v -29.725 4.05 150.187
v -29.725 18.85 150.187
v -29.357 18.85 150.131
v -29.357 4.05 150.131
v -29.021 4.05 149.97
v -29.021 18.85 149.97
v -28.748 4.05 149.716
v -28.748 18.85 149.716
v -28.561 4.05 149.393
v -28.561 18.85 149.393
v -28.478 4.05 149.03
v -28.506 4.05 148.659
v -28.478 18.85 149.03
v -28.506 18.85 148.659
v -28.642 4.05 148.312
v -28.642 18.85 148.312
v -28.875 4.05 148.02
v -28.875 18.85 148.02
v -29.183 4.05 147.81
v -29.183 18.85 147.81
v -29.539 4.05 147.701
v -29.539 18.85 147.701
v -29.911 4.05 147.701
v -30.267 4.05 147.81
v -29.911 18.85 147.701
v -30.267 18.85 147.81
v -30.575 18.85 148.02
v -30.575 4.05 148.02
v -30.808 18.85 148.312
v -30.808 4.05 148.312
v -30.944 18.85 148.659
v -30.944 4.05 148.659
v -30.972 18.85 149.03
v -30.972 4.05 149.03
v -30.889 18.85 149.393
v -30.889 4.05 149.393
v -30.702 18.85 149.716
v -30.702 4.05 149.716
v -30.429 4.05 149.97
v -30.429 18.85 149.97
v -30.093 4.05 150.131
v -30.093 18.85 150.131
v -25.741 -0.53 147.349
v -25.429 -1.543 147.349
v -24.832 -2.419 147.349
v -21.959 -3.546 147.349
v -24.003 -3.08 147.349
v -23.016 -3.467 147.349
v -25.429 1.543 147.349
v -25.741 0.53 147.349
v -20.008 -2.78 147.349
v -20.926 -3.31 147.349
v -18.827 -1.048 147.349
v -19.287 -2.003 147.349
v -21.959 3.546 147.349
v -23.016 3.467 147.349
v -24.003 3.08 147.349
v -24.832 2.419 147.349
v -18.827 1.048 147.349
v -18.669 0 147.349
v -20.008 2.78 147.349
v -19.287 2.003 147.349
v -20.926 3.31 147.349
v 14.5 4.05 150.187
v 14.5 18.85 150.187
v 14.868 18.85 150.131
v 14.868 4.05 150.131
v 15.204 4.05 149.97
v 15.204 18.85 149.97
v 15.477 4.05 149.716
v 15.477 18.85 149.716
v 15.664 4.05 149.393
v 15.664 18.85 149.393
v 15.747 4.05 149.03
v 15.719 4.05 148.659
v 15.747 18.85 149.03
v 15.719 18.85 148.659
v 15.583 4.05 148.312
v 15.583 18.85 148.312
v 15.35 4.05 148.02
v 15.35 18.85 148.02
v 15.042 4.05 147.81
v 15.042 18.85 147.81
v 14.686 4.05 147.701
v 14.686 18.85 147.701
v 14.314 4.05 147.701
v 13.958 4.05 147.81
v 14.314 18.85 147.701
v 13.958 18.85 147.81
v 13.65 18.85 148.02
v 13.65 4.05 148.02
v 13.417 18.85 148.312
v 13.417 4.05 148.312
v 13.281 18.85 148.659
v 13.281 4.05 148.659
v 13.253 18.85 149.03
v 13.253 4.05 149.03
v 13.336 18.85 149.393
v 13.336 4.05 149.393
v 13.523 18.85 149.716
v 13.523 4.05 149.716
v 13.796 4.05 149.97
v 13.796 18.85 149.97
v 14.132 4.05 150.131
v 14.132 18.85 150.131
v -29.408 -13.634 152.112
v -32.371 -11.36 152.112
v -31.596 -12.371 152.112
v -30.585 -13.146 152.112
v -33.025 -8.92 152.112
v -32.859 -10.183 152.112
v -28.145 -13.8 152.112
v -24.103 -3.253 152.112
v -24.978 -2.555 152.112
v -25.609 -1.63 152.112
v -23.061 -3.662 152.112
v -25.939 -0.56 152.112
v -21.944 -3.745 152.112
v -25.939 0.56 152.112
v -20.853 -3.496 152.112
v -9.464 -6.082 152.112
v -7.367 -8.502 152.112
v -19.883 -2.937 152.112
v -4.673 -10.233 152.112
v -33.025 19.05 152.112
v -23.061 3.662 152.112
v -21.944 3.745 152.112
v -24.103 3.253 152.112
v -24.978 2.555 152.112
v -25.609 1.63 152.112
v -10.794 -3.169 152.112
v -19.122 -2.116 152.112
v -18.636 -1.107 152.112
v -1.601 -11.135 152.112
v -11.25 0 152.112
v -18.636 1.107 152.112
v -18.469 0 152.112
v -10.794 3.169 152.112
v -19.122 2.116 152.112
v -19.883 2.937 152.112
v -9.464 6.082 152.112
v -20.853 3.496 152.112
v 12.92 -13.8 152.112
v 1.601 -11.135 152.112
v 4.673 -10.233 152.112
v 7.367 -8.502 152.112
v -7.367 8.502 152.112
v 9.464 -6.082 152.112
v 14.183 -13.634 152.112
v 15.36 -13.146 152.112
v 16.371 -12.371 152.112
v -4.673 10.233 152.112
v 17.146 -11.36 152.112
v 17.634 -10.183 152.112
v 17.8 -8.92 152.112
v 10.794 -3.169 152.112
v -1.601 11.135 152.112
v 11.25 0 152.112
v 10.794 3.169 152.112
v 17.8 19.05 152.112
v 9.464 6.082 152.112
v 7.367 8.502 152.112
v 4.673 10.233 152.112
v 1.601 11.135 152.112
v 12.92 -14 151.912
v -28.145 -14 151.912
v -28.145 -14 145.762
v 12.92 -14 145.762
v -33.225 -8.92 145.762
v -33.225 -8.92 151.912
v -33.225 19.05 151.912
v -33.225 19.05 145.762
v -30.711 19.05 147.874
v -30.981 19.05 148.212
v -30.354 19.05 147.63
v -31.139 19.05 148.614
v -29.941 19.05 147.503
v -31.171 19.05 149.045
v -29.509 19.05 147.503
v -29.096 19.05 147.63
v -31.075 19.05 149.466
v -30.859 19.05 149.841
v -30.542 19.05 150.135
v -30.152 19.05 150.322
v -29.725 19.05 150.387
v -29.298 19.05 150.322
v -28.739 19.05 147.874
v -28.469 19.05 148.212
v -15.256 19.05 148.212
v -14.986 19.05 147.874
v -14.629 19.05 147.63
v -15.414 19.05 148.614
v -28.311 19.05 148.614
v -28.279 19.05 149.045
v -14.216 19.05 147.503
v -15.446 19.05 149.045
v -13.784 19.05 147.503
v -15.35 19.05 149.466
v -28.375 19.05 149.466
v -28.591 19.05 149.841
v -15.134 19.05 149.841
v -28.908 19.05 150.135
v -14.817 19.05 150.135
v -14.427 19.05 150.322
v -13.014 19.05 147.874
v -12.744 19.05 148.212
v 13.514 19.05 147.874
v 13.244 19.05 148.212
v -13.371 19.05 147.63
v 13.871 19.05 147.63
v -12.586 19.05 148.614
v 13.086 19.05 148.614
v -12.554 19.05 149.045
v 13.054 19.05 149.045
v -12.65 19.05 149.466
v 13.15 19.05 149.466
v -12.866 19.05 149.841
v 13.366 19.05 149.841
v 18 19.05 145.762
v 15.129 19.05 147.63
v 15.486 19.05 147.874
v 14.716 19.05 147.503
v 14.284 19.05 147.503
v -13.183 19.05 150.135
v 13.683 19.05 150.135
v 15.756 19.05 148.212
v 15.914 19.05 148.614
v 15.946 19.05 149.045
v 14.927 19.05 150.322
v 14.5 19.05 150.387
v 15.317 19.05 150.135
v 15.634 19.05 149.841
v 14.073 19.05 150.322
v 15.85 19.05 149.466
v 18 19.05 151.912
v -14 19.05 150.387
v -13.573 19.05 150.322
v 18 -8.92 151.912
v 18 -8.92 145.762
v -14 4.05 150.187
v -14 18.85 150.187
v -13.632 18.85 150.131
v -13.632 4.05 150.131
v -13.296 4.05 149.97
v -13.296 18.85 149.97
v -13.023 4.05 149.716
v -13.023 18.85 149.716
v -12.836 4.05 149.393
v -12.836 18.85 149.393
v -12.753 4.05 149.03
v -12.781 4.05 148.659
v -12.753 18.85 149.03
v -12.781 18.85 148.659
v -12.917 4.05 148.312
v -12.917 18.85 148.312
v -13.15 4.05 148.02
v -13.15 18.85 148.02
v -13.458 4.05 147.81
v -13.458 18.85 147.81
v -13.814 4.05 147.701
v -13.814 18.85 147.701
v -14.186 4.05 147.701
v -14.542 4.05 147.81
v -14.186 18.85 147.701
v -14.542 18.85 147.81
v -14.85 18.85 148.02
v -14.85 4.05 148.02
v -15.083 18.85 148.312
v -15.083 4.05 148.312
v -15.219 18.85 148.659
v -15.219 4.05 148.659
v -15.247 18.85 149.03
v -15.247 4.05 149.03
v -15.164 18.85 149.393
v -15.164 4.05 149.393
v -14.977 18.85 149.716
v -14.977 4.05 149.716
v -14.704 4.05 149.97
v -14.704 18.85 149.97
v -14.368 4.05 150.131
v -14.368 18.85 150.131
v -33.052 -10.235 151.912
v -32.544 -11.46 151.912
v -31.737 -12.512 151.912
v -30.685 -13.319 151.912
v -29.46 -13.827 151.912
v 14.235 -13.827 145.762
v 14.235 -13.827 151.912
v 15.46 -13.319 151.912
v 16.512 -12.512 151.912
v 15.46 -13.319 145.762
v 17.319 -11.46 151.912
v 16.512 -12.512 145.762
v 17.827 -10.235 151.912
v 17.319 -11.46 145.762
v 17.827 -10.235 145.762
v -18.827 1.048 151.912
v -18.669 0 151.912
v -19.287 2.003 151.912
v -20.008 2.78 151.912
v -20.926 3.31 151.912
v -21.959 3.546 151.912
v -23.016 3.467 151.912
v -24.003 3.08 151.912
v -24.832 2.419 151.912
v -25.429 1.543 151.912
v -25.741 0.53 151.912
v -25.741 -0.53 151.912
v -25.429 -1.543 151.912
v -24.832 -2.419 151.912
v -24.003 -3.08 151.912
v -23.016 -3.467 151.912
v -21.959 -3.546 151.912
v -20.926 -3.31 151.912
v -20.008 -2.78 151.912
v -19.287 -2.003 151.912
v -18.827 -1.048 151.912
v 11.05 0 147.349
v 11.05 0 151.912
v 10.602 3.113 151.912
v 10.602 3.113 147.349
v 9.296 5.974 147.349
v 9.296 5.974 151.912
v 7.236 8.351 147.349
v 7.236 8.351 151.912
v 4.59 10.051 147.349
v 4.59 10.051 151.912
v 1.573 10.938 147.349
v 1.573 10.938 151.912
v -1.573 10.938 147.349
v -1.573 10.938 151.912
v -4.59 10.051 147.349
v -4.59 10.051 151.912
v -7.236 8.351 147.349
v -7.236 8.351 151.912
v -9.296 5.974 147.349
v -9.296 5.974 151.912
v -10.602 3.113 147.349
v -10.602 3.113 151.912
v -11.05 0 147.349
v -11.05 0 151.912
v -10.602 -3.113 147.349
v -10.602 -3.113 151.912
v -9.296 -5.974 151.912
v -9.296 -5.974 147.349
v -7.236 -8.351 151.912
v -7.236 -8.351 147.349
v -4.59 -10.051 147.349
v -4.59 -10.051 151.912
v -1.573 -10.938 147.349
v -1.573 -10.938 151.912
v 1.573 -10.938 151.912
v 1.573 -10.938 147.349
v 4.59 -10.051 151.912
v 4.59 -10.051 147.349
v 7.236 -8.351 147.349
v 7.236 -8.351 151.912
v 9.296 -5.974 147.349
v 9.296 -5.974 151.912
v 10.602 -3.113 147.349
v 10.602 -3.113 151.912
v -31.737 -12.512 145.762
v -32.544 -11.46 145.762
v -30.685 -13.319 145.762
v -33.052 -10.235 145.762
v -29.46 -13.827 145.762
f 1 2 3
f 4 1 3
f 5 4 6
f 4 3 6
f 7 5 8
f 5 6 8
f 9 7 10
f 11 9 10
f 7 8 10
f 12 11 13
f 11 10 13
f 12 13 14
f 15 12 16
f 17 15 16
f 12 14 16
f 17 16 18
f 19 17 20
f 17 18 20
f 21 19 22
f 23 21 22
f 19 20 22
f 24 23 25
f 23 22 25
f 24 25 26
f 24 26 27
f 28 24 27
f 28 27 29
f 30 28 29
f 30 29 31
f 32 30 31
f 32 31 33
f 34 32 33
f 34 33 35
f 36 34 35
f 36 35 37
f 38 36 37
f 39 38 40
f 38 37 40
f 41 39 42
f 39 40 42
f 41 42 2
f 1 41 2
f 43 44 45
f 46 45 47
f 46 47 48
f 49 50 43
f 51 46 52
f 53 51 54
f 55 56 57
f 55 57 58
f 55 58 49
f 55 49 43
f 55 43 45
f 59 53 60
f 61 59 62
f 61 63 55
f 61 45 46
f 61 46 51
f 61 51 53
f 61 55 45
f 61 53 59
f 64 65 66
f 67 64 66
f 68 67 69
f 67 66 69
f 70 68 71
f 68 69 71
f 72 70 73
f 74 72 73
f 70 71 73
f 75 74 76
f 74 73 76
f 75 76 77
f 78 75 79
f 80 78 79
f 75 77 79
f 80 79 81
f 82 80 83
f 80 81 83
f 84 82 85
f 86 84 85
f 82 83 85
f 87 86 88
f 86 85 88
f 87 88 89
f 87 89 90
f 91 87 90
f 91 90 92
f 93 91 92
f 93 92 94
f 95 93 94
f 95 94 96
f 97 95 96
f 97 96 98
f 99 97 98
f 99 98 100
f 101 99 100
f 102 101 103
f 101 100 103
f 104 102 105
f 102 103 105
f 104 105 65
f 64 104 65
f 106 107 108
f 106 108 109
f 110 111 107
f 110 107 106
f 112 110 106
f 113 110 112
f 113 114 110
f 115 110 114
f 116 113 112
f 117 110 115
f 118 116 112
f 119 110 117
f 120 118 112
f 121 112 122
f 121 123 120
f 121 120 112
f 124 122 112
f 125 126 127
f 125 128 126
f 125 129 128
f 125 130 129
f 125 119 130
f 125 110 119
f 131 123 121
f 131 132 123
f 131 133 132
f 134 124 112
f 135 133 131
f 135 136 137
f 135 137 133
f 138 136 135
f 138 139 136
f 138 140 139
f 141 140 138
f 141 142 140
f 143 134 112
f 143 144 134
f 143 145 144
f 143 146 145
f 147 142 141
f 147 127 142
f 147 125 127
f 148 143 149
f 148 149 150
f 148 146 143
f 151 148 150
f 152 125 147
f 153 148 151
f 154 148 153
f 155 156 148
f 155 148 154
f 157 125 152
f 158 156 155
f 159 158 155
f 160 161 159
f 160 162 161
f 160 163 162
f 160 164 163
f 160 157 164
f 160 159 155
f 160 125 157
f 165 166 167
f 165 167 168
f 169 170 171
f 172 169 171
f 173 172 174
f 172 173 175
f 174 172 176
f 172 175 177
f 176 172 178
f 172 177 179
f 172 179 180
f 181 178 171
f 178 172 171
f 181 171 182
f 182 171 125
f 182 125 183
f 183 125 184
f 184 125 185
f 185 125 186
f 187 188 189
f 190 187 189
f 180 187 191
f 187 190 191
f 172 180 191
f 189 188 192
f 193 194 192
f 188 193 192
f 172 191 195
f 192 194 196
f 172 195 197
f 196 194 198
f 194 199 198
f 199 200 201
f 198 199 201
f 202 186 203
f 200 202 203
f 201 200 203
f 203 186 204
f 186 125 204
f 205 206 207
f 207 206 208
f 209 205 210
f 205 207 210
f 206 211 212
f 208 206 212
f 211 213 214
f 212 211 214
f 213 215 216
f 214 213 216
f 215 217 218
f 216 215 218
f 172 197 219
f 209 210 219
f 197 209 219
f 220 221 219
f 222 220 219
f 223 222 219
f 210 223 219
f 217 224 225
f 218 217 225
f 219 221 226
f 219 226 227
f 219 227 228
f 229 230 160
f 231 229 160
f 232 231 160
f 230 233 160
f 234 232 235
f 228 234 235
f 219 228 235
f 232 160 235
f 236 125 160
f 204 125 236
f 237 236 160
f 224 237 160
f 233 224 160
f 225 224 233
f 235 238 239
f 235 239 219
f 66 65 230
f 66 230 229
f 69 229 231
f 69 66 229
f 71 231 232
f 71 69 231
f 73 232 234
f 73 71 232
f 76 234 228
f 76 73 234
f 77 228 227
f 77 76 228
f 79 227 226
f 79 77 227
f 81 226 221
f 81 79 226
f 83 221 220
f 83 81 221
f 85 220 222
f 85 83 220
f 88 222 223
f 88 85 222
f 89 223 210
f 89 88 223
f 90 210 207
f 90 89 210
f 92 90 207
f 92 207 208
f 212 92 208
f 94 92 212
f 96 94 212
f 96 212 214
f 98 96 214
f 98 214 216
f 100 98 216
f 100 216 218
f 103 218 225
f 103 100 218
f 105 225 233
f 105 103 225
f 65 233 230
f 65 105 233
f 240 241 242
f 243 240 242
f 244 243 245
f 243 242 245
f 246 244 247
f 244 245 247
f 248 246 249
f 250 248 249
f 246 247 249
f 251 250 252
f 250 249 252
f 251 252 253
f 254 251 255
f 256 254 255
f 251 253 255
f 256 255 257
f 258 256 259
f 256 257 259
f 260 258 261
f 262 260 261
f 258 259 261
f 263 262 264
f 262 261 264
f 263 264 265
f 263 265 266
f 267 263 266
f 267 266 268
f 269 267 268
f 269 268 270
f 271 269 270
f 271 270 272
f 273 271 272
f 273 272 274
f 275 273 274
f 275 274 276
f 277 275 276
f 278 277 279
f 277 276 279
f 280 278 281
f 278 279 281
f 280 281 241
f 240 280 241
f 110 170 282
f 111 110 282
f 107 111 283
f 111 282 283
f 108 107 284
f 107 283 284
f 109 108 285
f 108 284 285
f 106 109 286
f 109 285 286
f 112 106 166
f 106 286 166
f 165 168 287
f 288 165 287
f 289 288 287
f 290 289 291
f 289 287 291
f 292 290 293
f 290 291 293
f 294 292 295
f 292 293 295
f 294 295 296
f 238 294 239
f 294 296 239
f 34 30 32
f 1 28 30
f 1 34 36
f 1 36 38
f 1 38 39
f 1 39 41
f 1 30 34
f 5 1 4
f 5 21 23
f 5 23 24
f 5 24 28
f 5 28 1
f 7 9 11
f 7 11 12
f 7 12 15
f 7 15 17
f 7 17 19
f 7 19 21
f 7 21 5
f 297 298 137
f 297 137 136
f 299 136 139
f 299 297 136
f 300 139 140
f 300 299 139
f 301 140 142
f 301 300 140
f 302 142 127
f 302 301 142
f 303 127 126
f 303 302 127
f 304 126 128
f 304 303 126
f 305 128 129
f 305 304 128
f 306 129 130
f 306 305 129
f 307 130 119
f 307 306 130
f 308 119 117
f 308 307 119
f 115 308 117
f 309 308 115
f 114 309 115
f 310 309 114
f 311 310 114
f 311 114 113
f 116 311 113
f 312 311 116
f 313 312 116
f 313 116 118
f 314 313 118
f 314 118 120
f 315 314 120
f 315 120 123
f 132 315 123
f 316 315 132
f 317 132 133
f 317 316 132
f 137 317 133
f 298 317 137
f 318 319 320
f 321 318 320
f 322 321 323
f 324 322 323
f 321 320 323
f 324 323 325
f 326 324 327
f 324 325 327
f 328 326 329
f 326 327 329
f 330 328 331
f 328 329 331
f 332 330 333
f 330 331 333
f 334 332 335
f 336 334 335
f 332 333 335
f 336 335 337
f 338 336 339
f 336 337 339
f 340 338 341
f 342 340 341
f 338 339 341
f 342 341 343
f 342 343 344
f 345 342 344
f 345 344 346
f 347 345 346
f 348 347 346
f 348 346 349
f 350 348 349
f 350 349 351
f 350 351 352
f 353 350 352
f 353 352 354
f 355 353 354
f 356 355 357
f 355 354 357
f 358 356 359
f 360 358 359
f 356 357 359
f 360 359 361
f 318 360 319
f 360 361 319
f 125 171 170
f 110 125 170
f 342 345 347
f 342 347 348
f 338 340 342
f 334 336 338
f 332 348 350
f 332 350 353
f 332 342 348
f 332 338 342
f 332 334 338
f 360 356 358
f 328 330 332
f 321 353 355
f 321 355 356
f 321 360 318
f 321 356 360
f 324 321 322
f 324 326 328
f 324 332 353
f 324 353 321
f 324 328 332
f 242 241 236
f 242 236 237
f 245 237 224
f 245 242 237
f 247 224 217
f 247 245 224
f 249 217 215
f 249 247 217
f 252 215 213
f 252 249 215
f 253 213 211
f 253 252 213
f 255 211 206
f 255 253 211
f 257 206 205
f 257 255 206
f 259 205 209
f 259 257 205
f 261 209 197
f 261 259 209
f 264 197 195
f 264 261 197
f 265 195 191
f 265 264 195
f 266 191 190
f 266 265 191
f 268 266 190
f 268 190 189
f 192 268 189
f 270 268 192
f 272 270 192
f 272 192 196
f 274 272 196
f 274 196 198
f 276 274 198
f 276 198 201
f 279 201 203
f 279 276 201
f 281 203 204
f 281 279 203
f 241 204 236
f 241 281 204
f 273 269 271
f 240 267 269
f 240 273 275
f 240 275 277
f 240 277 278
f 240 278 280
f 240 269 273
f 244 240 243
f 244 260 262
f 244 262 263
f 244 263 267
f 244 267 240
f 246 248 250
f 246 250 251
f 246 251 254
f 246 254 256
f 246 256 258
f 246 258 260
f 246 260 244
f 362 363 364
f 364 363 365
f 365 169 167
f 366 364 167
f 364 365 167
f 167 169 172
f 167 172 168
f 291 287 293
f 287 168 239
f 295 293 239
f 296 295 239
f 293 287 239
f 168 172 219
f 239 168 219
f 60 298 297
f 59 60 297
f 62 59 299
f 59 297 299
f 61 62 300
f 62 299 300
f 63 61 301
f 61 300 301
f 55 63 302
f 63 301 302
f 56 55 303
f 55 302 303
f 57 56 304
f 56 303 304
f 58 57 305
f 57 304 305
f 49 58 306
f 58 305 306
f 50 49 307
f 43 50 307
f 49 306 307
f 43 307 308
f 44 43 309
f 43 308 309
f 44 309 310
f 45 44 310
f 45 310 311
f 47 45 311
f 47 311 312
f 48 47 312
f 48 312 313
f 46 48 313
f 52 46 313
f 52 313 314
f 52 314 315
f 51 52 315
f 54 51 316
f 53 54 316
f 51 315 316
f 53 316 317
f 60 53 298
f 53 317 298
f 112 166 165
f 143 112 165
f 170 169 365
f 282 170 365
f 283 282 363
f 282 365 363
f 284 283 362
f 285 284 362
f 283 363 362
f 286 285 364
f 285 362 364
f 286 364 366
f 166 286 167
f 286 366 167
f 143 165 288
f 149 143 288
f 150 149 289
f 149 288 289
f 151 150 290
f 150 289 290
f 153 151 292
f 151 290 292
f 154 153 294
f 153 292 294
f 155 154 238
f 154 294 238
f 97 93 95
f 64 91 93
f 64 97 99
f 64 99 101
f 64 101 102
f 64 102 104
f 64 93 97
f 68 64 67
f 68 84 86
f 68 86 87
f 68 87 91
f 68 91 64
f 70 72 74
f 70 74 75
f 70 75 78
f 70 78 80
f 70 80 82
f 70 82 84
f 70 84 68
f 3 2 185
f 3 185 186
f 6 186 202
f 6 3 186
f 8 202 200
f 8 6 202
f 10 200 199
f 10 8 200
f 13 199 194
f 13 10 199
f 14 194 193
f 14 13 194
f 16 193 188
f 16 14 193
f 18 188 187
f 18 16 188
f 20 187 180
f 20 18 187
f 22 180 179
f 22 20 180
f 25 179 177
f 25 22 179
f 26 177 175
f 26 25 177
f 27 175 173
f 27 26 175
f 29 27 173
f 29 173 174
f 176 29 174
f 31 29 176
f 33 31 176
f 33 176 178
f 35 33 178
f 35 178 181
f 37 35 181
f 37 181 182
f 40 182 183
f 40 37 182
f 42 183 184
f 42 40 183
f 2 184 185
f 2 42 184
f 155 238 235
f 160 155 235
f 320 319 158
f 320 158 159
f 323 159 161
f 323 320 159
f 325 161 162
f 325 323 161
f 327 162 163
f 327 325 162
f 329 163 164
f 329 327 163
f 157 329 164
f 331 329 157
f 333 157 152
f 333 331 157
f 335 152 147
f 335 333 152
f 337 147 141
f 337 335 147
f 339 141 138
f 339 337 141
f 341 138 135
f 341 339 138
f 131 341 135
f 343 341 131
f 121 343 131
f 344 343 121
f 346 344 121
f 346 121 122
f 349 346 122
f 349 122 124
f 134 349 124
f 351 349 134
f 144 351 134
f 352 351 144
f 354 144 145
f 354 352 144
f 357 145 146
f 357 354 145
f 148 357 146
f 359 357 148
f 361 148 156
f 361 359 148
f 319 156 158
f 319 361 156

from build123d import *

# Parameters (mm, degrees)
SKETCH1_W           = 51.225
SKETCH1_H           = 33.05
BOSS_EXTRUDE1_DEPTH = 6.35
SKETCH7_R           = 11.05
SKETCH7_R_2         = 3.556
CUT_EXTRUDE3_DEPTH  = 4.7625
SKETCH8_R           = 1.25
CUT_EXTRUDE4_DEPTH  = 15
FILLET3_R           = 5.08
CHAMFER2_SIZE       = 0.2


with BuildPart() as part:
    # Sketch1 → Boss-Extrude1 (new body)
    with BuildSketch(Plane.XY.offset(152.111703917)):
        with Locations((-7.6125, 2.525)):
            Rectangle(SKETCH1_W, SKETCH1_H)
    extrude(amount=-BOSS_EXTRUDE1_DEPTH)

    # Sketch7 → Cut-Extrude3 (cut)
    with BuildSketch(Plane.XY.offset(152.111703917)):
        Circle(SKETCH7_R)
        with Locations((-22.225, 0)):
            Circle(SKETCH7_R_2)
    extrude(amount=-CUT_EXTRUDE3_DEPTH, mode=Mode.SUBTRACT)

    # Sketch8 → Cut-Extrude4 (cut)
    with BuildSketch(Plane(origin=(0, 19.05, 0), x_dir=(1, 0, 0), z_dir=(0, 1, 0))):
        with Locations(Location((-29.725, -148.936703917, 0), (0, 0, 270))):
            Circle(SKETCH8_R)
        with Locations(Location((-14, -148.936703917, 0), (0, 0, 270))):
            Circle(SKETCH8_R)
        with Locations(Location((14.5, -148.936703917, 0), (0, 0, 270))):
            Circle(SKETCH8_R)
    extrude(amount=-CUT_EXTRUDE4_DEPTH, mode=Mode.SUBTRACT)

    # Fillet3
    fillet3_edges = [part.edges().sort_by_distance(p)[0] for p in [
        (18, -14, 148.936703917),
        (-33.225, -14, 148.936703917),
    ]]
    fillet(fillet3_edges, radius=FILLET3_R)

    # Chamfer2
    chamfer2_edges = [part.edges().sort_by_distance(p)[0] for p in [
        (-11.05, 0, 152.111703917),
        (-25.781, 0, 152.111703917),
        (-29.725, 19.05, 147.686703917),
        (-14, 19.05, 147.686703917),
        (14.5, 19.05, 147.686703917),
        (-7.6125, -14, 152.111703917),
        (18, 5.065, 152.111703917),
        (-31.737102448, -12.512102448, 152.111703917),
        (16.512102448, -12.512102448, 152.111703917),
        (-33.225, 5.065, 152.111703917),
    ]]
    chamfer(chamfer2_edges, length=CHAMFER2_SIZE)


solid = part.part
